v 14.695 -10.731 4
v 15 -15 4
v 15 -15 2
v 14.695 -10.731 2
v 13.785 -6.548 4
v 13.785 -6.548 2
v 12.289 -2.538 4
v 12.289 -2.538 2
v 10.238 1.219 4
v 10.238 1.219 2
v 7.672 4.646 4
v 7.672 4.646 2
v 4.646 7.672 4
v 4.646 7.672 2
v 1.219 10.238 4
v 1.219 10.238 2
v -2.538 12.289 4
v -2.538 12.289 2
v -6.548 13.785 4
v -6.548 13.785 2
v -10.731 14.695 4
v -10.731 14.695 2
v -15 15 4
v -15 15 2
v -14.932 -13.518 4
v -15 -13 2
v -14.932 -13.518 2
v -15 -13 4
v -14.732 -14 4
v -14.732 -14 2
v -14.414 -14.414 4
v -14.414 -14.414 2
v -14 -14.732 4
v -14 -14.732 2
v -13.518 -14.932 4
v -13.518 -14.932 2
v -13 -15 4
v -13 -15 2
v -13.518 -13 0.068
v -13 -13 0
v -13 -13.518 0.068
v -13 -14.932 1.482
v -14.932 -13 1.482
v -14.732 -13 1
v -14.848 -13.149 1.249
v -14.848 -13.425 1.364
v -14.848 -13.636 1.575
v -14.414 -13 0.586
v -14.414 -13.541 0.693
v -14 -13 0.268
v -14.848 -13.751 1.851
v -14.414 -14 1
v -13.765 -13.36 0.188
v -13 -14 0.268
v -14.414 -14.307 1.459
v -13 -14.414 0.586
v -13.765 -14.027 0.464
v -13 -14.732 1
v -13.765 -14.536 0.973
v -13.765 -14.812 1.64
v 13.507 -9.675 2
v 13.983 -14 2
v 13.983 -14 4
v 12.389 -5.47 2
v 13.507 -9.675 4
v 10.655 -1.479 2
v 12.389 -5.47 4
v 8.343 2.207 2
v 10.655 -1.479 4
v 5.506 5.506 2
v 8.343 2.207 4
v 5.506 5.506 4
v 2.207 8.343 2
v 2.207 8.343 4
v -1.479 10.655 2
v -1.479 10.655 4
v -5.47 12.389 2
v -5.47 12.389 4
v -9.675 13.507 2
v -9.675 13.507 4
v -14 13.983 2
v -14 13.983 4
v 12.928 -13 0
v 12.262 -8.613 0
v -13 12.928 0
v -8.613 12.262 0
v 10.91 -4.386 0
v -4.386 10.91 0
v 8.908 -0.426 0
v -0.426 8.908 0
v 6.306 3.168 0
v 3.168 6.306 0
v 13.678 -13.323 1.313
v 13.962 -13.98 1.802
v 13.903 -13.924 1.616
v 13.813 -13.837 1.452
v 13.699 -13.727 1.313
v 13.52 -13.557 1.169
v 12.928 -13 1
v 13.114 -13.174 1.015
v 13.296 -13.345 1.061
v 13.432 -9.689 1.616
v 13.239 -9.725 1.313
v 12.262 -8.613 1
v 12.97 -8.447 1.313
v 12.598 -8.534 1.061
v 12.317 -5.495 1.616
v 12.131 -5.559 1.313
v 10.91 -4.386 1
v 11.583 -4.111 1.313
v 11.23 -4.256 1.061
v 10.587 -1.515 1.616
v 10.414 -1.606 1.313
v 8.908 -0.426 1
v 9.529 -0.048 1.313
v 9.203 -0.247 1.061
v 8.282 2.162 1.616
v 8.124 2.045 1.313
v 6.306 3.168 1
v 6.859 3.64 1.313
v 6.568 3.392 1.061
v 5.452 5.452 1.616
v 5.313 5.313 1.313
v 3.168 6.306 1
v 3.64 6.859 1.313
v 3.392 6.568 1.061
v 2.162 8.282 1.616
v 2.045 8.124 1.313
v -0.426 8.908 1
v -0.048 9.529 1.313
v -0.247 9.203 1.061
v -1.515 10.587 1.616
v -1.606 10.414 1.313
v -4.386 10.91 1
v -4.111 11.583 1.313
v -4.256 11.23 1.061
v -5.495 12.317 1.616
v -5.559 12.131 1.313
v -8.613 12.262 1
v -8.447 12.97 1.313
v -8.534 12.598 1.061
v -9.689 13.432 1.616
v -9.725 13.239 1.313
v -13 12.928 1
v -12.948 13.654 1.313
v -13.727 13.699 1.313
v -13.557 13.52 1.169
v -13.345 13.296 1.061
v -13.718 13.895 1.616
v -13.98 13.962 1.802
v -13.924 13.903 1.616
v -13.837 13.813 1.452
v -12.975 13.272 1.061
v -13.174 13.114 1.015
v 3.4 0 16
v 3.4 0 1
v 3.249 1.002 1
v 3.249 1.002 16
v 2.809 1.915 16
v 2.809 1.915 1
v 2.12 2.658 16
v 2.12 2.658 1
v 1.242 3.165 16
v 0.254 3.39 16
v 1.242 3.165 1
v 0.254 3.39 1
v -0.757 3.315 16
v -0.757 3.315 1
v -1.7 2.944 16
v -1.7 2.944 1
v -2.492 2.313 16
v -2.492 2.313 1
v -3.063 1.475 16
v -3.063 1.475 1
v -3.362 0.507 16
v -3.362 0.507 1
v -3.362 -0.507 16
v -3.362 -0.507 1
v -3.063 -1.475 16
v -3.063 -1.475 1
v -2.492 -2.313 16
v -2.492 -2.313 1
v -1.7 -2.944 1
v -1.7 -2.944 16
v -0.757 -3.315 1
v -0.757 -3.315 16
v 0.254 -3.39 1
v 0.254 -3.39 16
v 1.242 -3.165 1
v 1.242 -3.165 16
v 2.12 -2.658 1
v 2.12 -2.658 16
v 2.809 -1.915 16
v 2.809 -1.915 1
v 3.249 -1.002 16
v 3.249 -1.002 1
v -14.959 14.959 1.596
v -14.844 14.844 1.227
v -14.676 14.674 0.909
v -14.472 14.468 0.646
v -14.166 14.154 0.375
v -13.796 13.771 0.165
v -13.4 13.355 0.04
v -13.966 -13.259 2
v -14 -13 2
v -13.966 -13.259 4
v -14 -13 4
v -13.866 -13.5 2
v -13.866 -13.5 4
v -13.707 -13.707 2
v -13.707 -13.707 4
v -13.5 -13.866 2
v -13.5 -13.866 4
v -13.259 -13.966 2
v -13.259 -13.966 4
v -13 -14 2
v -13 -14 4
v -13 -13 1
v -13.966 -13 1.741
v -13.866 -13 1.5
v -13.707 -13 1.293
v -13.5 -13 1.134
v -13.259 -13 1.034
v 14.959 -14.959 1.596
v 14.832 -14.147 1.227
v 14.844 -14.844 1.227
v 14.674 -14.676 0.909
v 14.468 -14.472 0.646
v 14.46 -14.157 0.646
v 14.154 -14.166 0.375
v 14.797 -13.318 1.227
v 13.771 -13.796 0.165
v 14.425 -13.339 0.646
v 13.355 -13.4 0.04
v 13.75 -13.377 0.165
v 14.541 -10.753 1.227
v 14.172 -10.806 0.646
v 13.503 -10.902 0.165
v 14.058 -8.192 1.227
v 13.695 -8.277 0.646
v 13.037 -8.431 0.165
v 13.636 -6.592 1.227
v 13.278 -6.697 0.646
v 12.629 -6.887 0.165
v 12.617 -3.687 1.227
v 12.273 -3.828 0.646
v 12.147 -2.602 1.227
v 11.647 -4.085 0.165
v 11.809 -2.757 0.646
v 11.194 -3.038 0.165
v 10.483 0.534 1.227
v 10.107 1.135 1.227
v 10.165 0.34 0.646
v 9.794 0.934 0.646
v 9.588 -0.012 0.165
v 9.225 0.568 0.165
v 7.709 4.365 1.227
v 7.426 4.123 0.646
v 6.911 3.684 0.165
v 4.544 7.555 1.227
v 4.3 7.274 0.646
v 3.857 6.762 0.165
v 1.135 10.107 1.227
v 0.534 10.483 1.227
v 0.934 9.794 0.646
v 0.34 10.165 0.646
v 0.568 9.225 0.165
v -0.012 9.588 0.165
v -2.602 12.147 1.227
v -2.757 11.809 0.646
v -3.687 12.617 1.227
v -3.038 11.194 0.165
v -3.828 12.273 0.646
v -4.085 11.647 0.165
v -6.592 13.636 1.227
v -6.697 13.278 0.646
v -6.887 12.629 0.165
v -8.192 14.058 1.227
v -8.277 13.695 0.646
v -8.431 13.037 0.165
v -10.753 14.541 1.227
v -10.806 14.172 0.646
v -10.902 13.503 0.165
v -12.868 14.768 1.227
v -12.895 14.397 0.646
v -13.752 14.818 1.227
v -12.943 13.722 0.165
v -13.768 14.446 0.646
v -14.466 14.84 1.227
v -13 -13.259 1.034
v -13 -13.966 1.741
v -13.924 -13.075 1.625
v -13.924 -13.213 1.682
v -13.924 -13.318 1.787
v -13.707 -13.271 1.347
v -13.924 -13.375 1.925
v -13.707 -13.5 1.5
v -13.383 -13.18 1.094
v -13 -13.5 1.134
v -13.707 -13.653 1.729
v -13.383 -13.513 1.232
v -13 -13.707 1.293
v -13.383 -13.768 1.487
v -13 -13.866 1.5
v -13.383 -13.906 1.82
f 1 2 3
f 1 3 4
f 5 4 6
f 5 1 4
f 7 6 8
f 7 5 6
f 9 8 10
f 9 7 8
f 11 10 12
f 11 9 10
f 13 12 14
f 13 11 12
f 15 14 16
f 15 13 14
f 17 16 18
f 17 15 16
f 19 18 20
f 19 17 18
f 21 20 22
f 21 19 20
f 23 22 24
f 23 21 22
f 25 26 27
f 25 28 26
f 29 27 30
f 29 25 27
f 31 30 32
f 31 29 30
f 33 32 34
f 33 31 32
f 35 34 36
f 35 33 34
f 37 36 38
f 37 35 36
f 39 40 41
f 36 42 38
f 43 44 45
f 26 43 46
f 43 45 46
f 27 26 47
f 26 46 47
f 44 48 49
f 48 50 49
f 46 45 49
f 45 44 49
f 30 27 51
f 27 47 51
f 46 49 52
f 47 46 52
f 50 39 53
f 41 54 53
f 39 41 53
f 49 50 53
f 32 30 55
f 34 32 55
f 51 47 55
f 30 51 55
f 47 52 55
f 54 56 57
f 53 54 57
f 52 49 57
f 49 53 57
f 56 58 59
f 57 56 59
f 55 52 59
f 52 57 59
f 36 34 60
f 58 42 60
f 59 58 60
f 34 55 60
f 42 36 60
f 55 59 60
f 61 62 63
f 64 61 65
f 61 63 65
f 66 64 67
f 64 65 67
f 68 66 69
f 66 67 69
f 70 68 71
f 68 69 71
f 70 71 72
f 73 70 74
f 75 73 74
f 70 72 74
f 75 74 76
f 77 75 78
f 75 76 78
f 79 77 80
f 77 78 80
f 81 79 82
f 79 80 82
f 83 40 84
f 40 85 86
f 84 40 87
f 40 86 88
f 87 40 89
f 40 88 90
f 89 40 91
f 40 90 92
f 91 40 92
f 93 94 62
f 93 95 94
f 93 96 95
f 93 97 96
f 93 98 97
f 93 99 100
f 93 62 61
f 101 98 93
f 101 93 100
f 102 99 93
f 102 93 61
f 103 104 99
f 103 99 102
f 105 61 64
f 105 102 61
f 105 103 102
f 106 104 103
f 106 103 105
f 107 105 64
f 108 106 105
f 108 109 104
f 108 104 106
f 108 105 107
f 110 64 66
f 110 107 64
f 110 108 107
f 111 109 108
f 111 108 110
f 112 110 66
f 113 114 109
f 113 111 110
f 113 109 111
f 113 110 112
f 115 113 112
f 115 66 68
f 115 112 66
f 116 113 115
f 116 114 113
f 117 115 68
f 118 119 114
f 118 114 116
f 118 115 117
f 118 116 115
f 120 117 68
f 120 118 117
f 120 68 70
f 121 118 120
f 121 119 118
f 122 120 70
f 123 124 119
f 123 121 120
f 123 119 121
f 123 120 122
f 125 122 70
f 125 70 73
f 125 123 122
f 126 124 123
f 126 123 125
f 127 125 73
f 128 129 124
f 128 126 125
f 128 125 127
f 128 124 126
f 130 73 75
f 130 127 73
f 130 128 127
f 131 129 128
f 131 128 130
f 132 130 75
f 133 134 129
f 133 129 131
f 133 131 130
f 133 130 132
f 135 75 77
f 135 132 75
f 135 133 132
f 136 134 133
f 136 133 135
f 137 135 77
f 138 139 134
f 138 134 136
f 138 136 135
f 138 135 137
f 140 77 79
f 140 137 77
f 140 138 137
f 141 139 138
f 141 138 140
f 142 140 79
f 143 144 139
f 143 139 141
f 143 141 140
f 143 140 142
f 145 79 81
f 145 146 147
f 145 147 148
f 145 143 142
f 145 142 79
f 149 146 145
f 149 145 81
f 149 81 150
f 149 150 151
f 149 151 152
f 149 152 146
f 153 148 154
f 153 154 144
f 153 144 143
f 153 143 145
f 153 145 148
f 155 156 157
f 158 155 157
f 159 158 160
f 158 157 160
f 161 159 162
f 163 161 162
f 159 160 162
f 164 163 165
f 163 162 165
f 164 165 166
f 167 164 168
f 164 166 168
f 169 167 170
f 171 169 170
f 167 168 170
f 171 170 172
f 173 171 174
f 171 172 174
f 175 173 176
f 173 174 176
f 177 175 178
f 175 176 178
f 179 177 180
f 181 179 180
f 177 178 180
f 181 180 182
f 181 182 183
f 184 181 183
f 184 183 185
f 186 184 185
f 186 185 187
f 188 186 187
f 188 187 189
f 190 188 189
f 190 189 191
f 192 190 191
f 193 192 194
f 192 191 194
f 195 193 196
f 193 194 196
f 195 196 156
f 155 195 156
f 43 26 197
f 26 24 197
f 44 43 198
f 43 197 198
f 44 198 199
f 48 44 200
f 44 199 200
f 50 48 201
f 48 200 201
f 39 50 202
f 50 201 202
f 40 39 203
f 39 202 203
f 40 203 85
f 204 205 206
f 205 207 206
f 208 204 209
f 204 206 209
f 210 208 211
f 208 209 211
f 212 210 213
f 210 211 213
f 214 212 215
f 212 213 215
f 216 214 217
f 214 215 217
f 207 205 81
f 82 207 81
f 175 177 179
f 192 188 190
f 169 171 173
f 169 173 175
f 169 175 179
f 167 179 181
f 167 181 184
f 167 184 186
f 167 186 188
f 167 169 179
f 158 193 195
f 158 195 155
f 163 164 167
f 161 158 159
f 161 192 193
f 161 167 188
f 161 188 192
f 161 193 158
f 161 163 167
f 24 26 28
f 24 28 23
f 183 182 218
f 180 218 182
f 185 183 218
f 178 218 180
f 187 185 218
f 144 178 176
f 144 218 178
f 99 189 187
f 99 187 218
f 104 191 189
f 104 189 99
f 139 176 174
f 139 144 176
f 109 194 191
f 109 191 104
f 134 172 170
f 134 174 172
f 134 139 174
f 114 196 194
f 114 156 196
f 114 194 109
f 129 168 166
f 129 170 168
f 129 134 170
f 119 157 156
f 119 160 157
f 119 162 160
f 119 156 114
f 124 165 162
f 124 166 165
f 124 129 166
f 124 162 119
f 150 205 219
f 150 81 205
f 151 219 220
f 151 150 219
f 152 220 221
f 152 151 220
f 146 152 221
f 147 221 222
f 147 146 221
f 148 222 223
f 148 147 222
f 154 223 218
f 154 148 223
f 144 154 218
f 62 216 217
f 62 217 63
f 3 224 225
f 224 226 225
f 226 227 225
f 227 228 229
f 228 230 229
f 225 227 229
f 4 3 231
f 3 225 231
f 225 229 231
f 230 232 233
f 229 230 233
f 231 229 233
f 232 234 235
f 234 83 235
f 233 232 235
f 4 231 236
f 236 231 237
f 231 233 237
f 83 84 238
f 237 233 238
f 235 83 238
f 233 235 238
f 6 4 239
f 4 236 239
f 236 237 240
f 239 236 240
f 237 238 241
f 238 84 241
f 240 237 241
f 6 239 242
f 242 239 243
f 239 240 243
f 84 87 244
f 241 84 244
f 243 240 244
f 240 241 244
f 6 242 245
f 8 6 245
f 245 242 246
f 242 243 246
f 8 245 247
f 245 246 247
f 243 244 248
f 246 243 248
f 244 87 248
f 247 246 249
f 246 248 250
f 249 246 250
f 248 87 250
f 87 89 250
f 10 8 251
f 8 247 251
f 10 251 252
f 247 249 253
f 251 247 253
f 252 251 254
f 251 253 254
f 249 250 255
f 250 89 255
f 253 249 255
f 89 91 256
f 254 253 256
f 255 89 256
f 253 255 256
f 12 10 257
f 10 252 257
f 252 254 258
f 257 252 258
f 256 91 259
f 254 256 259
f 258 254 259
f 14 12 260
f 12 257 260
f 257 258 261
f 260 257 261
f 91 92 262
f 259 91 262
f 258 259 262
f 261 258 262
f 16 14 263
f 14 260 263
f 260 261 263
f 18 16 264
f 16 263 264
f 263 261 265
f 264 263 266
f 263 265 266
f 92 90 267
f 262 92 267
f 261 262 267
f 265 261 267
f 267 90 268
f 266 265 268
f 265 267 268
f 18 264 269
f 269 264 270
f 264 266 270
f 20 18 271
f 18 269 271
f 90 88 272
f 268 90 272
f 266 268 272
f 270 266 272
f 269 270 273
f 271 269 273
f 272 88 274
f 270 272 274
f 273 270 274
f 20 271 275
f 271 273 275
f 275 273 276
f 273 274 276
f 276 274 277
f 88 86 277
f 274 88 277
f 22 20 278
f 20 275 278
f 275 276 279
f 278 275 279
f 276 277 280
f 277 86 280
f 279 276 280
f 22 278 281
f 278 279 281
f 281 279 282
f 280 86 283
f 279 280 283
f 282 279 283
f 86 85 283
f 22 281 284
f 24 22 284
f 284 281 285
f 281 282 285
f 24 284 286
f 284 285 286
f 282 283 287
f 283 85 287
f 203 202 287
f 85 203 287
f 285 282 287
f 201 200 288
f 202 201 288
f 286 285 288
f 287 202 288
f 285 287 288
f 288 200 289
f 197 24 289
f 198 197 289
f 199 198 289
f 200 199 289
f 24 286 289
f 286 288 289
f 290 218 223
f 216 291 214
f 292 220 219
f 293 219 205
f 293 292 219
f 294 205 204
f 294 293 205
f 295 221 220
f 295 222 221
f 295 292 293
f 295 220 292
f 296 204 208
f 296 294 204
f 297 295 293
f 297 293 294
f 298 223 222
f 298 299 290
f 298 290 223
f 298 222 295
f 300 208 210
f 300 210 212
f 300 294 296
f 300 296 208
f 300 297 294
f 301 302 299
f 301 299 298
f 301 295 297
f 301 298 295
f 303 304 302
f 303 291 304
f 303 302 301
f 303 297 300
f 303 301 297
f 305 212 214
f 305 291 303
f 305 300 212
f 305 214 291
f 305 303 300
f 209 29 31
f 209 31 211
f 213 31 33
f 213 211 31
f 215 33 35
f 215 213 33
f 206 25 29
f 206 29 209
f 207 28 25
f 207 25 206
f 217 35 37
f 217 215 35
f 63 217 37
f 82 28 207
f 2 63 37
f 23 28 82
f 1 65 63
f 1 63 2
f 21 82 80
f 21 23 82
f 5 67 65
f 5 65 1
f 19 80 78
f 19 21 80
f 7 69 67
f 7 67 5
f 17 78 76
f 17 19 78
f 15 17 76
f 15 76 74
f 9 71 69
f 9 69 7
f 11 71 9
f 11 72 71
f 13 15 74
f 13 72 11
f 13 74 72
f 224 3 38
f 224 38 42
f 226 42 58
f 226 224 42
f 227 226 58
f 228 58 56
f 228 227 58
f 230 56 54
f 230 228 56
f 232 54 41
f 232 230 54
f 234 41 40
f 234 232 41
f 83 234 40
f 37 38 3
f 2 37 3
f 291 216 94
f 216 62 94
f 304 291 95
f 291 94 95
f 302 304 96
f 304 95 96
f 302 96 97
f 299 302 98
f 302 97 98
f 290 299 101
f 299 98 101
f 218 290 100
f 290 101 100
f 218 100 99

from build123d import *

# Parameters (mm, degrees)
SKETCH_1_W          = 30
SKETCH_1_H          = 30
EXTRUDE_1_DEPTH     = 4
CUT_EXTRUDE_1_DEPTH = 22.587033145
FILLET_1_R          = 2
SHELL_1_T           = -1
SKETCH_2_R          = 3.4
EXTRUDE_2_DEPTH     = 15


with BuildPart() as part:
    # 草图1 → 凸台-拉伸1 (new body)
    with BuildSketch(Plane.XY):
        Rectangle(SKETCH_1_W, SKETCH_1_H)
    extrude(amount=EXTRUDE_1_DEPTH)

    # 草图4 → 切除-拉伸1 (cut, through all)
    with BuildSketch(Plane.XY.offset(4)):
        with BuildLine():
            Line((-15, 15), (15, 15))
            Line((15, 15), (15, -15))
            ThreePointArc((15, -15), (6.213203436, 6.213203436), (-15, 15))
        make_face()
    extrude(amount=-CUT_EXTRUDE_1_DEPTH, mode=Mode.SUBTRACT)

    # 圆角1
    fillet_1_edges = [part.edges().sort_by_distance(p)[0] for p in [
        (6.213203436, 6.213203436, 0),
        (0, -15, 0),
        (-15, 0, 0),
        (-15, -15, 2),
    ]]
    fillet(fillet_1_edges, radius=FILLET_1_R)

    # 抽壳1
    shell_1_openings = [part.faces().sort_by_distance(p)[0] for p in [
        (-2.252666732, -2.252666732, 4),
    ]]
    offset(amount=SHELL_1_T, openings=shell_1_openings)

    # 草图2 → 凸台-拉伸2 (add)
    with BuildSketch(Plane.XY.offset(1)):
        Circle(SKETCH_2_R)
    extrude(amount=EXTRUDE_2_DEPTH)


solid = part.part
